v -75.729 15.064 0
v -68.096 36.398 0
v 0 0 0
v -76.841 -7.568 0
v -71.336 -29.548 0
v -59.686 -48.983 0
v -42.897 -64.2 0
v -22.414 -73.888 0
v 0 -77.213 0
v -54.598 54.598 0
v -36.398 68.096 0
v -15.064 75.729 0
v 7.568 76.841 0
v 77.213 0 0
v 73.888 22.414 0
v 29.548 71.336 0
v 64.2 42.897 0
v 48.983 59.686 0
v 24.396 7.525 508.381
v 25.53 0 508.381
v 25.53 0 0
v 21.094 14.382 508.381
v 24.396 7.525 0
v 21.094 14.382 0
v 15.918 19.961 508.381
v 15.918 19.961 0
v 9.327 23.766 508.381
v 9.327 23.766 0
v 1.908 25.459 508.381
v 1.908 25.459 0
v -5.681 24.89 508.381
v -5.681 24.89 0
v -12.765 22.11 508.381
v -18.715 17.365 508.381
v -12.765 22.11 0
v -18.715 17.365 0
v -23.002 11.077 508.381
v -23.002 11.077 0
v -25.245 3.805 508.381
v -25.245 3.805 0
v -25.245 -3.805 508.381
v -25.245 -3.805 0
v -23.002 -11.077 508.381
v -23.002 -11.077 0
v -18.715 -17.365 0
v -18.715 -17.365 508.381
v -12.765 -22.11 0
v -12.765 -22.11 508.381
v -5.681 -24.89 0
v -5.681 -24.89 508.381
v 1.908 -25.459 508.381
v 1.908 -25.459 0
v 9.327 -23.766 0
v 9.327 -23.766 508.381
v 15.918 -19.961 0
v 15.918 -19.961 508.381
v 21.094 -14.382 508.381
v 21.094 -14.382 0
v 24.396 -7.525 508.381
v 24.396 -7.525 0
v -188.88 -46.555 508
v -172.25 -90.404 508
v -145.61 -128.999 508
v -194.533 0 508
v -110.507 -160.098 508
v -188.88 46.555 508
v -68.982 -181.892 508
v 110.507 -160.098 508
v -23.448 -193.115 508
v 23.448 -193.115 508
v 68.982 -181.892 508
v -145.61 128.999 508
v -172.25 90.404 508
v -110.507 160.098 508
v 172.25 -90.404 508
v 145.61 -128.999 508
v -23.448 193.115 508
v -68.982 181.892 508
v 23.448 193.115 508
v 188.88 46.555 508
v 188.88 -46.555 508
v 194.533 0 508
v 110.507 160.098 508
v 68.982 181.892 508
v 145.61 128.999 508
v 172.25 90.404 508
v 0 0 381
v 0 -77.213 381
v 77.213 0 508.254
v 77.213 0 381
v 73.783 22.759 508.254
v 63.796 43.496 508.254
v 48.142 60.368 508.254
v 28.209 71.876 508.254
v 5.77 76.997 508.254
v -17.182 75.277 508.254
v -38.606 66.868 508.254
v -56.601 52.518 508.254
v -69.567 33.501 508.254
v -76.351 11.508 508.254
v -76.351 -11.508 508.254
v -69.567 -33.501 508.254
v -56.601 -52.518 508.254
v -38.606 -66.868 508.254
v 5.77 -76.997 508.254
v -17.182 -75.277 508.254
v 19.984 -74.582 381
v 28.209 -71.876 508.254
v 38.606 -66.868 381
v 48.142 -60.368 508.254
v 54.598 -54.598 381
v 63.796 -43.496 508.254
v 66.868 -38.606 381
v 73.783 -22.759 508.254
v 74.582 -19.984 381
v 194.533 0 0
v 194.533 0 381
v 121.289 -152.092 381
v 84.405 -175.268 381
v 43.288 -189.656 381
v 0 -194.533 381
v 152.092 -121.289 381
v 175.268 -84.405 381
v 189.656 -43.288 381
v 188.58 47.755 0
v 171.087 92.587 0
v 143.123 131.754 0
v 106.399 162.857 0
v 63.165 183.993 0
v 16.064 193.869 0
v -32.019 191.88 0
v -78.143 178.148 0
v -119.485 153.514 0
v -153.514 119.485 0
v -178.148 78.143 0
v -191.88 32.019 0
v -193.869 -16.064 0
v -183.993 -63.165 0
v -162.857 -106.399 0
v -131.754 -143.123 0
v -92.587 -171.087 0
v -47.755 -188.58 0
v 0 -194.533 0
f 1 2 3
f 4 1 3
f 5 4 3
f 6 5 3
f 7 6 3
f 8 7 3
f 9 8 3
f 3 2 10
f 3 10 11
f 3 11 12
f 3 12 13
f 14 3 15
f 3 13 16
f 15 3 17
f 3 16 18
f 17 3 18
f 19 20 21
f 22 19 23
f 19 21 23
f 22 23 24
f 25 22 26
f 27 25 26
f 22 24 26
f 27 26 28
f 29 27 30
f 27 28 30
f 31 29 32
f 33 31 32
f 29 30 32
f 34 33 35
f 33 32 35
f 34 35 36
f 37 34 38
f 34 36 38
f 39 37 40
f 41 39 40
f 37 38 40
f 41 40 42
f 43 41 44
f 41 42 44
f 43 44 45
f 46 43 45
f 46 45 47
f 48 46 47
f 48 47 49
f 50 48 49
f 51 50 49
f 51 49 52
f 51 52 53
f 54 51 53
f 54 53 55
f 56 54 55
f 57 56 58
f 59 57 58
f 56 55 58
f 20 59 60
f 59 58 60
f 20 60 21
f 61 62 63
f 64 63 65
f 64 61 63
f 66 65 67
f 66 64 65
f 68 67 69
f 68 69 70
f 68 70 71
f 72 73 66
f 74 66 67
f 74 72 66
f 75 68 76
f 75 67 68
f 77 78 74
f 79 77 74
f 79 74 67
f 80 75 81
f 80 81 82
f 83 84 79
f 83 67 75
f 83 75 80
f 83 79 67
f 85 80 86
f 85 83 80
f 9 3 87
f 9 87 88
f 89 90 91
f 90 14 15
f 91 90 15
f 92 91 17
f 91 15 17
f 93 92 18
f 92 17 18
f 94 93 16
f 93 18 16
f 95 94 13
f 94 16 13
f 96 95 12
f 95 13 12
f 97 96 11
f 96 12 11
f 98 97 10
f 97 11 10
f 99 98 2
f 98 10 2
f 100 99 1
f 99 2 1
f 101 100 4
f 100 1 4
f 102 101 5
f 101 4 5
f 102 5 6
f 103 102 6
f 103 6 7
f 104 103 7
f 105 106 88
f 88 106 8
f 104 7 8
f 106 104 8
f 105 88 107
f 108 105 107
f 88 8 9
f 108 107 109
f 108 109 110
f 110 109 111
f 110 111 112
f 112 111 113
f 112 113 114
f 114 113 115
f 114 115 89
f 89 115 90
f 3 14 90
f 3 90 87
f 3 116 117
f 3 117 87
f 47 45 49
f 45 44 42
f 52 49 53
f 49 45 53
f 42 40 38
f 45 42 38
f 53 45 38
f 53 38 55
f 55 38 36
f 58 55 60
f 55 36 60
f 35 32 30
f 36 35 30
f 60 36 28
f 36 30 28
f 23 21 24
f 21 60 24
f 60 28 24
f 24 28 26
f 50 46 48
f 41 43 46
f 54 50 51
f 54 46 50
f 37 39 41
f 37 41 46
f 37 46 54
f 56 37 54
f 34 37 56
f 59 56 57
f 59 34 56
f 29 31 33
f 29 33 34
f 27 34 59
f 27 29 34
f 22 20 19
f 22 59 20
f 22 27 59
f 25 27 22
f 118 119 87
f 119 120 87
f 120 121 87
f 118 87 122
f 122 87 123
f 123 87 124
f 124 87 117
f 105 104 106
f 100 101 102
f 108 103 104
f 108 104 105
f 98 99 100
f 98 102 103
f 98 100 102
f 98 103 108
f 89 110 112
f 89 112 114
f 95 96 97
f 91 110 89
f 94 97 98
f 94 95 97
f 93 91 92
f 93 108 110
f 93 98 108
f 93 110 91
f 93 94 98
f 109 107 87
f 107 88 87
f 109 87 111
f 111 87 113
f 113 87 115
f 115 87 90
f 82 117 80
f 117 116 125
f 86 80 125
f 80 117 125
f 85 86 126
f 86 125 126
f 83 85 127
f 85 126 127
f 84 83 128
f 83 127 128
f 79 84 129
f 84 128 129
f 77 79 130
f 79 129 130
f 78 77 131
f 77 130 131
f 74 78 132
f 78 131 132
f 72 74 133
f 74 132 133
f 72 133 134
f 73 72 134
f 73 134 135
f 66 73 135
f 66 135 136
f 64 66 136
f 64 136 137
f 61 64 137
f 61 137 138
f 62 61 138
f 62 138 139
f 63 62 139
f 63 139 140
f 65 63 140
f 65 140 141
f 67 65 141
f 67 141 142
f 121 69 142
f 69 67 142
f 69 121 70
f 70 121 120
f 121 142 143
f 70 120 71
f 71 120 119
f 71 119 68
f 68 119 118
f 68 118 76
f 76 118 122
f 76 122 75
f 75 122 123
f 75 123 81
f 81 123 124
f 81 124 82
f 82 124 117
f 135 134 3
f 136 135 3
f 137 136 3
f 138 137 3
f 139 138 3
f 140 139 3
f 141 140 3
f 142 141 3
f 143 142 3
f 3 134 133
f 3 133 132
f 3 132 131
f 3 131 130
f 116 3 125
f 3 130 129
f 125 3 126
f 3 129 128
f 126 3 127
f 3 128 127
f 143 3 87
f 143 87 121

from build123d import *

# Parameters (mm, degrees)
F0_R     = 194.5330357486
F3_DEPTH = 508
F1_R     = 77.2129975411
F4_DEPTH = 508.254
F2_R     = 25.5304809281
F5_DEPTH = 508.381
F7_DEPTH = 381


with BuildPart() as f3:
    # F0 (on Top) → F3 (new body)
    with BuildSketch(Plane.XY):
        Circle(F0_R)
    extrude(amount=F3_DEPTH)


with BuildPart() as f4:
    # F1 (on Top) → F4 (new body)
    with BuildSketch(Plane.XY):
        Circle(F1_R)
    extrude(amount=F4_DEPTH)


with BuildPart() as f5:
    # F2 (on Top) → F5 (new body)
    with BuildSketch(Plane.XY):
        Circle(F2_R)
    extrude(amount=F5_DEPTH)


with BuildPart() as f7_tool:
    # F6 (on Top) → F7 (new body)
    with BuildSketch(Plane.XY):
        with BuildLine():
            Line((257.4372589588, 0), (0, 0))
            Line((0, 0), (0, -257.4372589588))
            ThreePointArc((0, -257.4372589588), (182.0356315399, -182.0356315399), (257.4372589588, 0))
        make_face()
    extrude(amount=F7_DEPTH)


with BuildPart() as f3_1:
    add(f3.part)

    # F7: cut by f7_tool
    add(f7_tool.part, mode=Mode.SUBTRACT)


with BuildPart() as f4_1:
    add(f4.part)

    # F7: cut by f7_tool
    add(f7_tool.part, mode=Mode.SUBTRACT)


solid = Compound([f5.part, f3_1.part, f4_1.part])
